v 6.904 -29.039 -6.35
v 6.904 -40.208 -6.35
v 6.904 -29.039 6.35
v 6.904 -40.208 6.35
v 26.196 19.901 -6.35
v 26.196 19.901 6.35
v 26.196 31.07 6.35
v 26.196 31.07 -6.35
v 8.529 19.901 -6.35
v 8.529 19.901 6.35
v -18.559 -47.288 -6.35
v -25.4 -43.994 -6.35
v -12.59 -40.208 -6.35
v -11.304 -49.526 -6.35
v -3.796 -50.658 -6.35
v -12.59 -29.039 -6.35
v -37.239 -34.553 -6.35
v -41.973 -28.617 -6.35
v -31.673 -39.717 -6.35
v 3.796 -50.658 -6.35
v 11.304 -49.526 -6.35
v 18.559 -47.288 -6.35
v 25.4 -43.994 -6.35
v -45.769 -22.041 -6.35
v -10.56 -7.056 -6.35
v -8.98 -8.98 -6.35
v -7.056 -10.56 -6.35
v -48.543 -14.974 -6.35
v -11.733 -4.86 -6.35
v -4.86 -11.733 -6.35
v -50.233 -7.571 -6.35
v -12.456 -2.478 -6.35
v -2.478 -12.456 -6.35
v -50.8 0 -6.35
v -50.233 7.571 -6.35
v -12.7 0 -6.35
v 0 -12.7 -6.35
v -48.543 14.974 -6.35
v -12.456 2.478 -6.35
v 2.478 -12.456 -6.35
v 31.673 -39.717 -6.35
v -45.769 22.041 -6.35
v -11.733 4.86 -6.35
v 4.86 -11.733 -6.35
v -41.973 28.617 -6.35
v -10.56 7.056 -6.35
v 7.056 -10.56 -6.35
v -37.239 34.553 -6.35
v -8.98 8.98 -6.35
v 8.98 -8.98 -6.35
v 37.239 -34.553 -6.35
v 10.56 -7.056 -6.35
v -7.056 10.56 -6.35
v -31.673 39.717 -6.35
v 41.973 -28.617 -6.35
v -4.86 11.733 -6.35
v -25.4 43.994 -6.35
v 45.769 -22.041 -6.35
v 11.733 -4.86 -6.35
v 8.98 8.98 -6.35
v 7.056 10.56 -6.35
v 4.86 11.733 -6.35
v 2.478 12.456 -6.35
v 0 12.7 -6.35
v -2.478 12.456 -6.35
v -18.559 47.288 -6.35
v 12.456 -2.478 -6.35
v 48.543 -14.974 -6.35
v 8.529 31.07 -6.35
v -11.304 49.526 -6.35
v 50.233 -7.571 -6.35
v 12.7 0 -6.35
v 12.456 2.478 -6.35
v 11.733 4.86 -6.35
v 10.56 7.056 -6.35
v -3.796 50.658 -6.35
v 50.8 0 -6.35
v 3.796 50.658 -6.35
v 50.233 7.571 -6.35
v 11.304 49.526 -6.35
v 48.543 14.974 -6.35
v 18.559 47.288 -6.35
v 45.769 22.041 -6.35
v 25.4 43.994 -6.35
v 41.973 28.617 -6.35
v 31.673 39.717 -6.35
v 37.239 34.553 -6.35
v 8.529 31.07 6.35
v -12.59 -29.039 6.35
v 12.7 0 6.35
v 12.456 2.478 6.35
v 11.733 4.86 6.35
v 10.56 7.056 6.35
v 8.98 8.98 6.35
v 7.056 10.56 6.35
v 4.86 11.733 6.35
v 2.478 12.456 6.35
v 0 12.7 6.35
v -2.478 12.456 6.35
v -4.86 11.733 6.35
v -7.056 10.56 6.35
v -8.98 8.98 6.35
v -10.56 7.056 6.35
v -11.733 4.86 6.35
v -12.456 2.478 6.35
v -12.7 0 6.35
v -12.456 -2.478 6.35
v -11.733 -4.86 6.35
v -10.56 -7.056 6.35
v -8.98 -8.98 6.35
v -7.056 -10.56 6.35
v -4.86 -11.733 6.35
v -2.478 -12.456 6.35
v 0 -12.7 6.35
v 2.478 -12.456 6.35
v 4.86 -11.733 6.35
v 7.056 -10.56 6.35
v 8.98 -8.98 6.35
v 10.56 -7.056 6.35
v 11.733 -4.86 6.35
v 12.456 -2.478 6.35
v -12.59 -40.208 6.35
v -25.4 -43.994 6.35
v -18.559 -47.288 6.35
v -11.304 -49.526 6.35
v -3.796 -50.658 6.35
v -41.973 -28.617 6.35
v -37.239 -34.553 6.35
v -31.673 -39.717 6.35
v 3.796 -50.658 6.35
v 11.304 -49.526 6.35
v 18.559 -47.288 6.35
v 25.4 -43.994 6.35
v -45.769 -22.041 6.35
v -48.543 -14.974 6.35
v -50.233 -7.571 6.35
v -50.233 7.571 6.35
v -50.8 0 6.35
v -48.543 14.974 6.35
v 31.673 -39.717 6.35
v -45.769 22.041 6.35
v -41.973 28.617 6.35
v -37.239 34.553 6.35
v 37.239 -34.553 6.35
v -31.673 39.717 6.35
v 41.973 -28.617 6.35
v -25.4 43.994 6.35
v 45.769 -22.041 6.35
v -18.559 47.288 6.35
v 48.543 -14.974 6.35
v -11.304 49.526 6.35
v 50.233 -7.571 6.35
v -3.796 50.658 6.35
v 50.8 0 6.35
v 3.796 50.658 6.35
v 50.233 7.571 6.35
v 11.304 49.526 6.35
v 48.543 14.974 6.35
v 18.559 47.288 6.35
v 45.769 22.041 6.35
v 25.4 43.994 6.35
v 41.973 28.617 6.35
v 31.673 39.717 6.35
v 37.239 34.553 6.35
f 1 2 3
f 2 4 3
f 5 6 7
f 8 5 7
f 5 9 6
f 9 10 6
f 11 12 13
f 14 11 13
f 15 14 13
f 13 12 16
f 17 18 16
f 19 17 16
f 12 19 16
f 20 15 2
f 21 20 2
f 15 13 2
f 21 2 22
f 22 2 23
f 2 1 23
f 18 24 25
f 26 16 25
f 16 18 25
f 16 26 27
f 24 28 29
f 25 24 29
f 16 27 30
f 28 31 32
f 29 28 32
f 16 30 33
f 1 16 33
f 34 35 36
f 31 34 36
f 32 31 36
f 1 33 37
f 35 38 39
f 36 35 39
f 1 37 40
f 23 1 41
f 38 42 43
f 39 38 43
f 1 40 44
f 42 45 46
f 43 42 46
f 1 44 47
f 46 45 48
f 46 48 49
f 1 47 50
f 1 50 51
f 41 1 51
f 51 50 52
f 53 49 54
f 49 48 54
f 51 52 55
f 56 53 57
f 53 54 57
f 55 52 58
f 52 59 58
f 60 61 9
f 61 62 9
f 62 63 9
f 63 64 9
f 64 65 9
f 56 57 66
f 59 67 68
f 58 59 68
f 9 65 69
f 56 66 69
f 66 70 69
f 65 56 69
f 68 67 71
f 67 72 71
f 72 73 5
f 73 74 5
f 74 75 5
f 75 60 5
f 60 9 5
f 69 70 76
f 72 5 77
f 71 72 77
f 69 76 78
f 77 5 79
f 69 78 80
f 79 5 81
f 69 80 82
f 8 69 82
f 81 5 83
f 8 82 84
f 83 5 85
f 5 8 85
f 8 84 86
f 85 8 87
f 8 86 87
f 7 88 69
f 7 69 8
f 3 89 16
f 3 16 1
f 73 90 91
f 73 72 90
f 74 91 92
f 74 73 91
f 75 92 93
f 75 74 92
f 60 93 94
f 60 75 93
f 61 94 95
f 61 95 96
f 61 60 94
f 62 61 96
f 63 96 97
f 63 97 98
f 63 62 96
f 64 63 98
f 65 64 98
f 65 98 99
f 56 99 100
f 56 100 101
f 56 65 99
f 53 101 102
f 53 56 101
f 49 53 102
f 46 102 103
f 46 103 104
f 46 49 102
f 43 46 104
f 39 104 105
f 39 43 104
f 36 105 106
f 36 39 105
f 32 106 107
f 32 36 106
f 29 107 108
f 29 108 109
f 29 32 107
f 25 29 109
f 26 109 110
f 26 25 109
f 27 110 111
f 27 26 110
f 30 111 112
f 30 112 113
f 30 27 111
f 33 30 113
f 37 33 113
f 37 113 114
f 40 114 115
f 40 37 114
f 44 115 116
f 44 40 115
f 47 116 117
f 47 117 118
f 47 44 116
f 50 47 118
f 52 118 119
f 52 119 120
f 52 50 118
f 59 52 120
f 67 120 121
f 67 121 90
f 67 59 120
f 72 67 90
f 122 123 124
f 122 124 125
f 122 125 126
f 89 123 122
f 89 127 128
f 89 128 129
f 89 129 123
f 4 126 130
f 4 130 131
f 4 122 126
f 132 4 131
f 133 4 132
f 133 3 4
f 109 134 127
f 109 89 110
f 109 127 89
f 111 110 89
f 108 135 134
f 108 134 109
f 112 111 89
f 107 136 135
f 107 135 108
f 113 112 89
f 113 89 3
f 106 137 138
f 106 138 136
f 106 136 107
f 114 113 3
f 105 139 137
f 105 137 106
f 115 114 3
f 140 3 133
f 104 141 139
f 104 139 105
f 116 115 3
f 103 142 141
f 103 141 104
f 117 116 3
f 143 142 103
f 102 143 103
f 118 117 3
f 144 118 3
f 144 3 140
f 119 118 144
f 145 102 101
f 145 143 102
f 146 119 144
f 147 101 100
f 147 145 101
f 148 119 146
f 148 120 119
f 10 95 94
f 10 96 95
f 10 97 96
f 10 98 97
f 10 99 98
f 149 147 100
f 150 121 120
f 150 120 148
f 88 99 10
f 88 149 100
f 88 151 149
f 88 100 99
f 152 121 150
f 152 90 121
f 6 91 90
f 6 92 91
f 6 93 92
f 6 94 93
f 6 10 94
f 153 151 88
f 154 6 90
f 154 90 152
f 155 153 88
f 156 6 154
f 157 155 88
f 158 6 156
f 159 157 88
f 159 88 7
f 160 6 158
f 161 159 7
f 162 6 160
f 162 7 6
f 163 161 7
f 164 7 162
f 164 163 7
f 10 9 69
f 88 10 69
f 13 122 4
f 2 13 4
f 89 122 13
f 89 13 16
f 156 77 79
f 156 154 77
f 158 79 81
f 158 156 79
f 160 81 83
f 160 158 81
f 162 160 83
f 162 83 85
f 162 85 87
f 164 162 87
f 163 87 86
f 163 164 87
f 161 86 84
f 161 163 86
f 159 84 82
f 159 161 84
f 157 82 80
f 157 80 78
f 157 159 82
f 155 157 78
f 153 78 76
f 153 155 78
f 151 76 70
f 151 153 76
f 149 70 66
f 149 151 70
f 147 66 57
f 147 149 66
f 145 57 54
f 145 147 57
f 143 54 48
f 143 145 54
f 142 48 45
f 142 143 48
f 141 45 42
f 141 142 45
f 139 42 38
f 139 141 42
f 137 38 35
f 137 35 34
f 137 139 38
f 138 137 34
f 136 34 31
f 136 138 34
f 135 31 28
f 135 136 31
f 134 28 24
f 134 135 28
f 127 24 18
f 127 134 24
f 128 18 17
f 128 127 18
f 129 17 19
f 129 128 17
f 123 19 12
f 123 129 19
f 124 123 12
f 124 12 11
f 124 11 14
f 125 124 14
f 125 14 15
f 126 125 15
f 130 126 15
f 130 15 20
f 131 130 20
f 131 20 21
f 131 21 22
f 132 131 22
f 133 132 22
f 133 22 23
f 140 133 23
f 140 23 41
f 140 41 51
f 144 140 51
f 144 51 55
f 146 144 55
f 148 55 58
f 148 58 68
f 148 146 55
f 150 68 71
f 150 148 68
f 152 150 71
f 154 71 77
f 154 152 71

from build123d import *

# Parameters (mm, degrees)
F0_R     = 50.8
F0_W     = 19.494822
F0_H     = 11.168908
F0_R_2   = 12.7
F0_W_2   = 17.667183
F0_H_2   = 11.16891
F1_DEPTH = 6.35


with BuildPart() as f1:
    # F0 (on Top) → F1 (new body, symmetric)
    with BuildSketch(Plane.XY):
        Circle(F0_R)
        with Locations((-2.842995, -34.623617)):
            Rectangle(F0_W, F0_H, mode=Mode.SUBTRACT)
        Circle(F0_R_2, mode=Mode.SUBTRACT)
        with Locations((17.362575, 25.48542)):
            Rectangle(F0_W_2, F0_H_2, mode=Mode.SUBTRACT)
    extrude(amount=F1_DEPTH, both=True)


solid = f1.part
